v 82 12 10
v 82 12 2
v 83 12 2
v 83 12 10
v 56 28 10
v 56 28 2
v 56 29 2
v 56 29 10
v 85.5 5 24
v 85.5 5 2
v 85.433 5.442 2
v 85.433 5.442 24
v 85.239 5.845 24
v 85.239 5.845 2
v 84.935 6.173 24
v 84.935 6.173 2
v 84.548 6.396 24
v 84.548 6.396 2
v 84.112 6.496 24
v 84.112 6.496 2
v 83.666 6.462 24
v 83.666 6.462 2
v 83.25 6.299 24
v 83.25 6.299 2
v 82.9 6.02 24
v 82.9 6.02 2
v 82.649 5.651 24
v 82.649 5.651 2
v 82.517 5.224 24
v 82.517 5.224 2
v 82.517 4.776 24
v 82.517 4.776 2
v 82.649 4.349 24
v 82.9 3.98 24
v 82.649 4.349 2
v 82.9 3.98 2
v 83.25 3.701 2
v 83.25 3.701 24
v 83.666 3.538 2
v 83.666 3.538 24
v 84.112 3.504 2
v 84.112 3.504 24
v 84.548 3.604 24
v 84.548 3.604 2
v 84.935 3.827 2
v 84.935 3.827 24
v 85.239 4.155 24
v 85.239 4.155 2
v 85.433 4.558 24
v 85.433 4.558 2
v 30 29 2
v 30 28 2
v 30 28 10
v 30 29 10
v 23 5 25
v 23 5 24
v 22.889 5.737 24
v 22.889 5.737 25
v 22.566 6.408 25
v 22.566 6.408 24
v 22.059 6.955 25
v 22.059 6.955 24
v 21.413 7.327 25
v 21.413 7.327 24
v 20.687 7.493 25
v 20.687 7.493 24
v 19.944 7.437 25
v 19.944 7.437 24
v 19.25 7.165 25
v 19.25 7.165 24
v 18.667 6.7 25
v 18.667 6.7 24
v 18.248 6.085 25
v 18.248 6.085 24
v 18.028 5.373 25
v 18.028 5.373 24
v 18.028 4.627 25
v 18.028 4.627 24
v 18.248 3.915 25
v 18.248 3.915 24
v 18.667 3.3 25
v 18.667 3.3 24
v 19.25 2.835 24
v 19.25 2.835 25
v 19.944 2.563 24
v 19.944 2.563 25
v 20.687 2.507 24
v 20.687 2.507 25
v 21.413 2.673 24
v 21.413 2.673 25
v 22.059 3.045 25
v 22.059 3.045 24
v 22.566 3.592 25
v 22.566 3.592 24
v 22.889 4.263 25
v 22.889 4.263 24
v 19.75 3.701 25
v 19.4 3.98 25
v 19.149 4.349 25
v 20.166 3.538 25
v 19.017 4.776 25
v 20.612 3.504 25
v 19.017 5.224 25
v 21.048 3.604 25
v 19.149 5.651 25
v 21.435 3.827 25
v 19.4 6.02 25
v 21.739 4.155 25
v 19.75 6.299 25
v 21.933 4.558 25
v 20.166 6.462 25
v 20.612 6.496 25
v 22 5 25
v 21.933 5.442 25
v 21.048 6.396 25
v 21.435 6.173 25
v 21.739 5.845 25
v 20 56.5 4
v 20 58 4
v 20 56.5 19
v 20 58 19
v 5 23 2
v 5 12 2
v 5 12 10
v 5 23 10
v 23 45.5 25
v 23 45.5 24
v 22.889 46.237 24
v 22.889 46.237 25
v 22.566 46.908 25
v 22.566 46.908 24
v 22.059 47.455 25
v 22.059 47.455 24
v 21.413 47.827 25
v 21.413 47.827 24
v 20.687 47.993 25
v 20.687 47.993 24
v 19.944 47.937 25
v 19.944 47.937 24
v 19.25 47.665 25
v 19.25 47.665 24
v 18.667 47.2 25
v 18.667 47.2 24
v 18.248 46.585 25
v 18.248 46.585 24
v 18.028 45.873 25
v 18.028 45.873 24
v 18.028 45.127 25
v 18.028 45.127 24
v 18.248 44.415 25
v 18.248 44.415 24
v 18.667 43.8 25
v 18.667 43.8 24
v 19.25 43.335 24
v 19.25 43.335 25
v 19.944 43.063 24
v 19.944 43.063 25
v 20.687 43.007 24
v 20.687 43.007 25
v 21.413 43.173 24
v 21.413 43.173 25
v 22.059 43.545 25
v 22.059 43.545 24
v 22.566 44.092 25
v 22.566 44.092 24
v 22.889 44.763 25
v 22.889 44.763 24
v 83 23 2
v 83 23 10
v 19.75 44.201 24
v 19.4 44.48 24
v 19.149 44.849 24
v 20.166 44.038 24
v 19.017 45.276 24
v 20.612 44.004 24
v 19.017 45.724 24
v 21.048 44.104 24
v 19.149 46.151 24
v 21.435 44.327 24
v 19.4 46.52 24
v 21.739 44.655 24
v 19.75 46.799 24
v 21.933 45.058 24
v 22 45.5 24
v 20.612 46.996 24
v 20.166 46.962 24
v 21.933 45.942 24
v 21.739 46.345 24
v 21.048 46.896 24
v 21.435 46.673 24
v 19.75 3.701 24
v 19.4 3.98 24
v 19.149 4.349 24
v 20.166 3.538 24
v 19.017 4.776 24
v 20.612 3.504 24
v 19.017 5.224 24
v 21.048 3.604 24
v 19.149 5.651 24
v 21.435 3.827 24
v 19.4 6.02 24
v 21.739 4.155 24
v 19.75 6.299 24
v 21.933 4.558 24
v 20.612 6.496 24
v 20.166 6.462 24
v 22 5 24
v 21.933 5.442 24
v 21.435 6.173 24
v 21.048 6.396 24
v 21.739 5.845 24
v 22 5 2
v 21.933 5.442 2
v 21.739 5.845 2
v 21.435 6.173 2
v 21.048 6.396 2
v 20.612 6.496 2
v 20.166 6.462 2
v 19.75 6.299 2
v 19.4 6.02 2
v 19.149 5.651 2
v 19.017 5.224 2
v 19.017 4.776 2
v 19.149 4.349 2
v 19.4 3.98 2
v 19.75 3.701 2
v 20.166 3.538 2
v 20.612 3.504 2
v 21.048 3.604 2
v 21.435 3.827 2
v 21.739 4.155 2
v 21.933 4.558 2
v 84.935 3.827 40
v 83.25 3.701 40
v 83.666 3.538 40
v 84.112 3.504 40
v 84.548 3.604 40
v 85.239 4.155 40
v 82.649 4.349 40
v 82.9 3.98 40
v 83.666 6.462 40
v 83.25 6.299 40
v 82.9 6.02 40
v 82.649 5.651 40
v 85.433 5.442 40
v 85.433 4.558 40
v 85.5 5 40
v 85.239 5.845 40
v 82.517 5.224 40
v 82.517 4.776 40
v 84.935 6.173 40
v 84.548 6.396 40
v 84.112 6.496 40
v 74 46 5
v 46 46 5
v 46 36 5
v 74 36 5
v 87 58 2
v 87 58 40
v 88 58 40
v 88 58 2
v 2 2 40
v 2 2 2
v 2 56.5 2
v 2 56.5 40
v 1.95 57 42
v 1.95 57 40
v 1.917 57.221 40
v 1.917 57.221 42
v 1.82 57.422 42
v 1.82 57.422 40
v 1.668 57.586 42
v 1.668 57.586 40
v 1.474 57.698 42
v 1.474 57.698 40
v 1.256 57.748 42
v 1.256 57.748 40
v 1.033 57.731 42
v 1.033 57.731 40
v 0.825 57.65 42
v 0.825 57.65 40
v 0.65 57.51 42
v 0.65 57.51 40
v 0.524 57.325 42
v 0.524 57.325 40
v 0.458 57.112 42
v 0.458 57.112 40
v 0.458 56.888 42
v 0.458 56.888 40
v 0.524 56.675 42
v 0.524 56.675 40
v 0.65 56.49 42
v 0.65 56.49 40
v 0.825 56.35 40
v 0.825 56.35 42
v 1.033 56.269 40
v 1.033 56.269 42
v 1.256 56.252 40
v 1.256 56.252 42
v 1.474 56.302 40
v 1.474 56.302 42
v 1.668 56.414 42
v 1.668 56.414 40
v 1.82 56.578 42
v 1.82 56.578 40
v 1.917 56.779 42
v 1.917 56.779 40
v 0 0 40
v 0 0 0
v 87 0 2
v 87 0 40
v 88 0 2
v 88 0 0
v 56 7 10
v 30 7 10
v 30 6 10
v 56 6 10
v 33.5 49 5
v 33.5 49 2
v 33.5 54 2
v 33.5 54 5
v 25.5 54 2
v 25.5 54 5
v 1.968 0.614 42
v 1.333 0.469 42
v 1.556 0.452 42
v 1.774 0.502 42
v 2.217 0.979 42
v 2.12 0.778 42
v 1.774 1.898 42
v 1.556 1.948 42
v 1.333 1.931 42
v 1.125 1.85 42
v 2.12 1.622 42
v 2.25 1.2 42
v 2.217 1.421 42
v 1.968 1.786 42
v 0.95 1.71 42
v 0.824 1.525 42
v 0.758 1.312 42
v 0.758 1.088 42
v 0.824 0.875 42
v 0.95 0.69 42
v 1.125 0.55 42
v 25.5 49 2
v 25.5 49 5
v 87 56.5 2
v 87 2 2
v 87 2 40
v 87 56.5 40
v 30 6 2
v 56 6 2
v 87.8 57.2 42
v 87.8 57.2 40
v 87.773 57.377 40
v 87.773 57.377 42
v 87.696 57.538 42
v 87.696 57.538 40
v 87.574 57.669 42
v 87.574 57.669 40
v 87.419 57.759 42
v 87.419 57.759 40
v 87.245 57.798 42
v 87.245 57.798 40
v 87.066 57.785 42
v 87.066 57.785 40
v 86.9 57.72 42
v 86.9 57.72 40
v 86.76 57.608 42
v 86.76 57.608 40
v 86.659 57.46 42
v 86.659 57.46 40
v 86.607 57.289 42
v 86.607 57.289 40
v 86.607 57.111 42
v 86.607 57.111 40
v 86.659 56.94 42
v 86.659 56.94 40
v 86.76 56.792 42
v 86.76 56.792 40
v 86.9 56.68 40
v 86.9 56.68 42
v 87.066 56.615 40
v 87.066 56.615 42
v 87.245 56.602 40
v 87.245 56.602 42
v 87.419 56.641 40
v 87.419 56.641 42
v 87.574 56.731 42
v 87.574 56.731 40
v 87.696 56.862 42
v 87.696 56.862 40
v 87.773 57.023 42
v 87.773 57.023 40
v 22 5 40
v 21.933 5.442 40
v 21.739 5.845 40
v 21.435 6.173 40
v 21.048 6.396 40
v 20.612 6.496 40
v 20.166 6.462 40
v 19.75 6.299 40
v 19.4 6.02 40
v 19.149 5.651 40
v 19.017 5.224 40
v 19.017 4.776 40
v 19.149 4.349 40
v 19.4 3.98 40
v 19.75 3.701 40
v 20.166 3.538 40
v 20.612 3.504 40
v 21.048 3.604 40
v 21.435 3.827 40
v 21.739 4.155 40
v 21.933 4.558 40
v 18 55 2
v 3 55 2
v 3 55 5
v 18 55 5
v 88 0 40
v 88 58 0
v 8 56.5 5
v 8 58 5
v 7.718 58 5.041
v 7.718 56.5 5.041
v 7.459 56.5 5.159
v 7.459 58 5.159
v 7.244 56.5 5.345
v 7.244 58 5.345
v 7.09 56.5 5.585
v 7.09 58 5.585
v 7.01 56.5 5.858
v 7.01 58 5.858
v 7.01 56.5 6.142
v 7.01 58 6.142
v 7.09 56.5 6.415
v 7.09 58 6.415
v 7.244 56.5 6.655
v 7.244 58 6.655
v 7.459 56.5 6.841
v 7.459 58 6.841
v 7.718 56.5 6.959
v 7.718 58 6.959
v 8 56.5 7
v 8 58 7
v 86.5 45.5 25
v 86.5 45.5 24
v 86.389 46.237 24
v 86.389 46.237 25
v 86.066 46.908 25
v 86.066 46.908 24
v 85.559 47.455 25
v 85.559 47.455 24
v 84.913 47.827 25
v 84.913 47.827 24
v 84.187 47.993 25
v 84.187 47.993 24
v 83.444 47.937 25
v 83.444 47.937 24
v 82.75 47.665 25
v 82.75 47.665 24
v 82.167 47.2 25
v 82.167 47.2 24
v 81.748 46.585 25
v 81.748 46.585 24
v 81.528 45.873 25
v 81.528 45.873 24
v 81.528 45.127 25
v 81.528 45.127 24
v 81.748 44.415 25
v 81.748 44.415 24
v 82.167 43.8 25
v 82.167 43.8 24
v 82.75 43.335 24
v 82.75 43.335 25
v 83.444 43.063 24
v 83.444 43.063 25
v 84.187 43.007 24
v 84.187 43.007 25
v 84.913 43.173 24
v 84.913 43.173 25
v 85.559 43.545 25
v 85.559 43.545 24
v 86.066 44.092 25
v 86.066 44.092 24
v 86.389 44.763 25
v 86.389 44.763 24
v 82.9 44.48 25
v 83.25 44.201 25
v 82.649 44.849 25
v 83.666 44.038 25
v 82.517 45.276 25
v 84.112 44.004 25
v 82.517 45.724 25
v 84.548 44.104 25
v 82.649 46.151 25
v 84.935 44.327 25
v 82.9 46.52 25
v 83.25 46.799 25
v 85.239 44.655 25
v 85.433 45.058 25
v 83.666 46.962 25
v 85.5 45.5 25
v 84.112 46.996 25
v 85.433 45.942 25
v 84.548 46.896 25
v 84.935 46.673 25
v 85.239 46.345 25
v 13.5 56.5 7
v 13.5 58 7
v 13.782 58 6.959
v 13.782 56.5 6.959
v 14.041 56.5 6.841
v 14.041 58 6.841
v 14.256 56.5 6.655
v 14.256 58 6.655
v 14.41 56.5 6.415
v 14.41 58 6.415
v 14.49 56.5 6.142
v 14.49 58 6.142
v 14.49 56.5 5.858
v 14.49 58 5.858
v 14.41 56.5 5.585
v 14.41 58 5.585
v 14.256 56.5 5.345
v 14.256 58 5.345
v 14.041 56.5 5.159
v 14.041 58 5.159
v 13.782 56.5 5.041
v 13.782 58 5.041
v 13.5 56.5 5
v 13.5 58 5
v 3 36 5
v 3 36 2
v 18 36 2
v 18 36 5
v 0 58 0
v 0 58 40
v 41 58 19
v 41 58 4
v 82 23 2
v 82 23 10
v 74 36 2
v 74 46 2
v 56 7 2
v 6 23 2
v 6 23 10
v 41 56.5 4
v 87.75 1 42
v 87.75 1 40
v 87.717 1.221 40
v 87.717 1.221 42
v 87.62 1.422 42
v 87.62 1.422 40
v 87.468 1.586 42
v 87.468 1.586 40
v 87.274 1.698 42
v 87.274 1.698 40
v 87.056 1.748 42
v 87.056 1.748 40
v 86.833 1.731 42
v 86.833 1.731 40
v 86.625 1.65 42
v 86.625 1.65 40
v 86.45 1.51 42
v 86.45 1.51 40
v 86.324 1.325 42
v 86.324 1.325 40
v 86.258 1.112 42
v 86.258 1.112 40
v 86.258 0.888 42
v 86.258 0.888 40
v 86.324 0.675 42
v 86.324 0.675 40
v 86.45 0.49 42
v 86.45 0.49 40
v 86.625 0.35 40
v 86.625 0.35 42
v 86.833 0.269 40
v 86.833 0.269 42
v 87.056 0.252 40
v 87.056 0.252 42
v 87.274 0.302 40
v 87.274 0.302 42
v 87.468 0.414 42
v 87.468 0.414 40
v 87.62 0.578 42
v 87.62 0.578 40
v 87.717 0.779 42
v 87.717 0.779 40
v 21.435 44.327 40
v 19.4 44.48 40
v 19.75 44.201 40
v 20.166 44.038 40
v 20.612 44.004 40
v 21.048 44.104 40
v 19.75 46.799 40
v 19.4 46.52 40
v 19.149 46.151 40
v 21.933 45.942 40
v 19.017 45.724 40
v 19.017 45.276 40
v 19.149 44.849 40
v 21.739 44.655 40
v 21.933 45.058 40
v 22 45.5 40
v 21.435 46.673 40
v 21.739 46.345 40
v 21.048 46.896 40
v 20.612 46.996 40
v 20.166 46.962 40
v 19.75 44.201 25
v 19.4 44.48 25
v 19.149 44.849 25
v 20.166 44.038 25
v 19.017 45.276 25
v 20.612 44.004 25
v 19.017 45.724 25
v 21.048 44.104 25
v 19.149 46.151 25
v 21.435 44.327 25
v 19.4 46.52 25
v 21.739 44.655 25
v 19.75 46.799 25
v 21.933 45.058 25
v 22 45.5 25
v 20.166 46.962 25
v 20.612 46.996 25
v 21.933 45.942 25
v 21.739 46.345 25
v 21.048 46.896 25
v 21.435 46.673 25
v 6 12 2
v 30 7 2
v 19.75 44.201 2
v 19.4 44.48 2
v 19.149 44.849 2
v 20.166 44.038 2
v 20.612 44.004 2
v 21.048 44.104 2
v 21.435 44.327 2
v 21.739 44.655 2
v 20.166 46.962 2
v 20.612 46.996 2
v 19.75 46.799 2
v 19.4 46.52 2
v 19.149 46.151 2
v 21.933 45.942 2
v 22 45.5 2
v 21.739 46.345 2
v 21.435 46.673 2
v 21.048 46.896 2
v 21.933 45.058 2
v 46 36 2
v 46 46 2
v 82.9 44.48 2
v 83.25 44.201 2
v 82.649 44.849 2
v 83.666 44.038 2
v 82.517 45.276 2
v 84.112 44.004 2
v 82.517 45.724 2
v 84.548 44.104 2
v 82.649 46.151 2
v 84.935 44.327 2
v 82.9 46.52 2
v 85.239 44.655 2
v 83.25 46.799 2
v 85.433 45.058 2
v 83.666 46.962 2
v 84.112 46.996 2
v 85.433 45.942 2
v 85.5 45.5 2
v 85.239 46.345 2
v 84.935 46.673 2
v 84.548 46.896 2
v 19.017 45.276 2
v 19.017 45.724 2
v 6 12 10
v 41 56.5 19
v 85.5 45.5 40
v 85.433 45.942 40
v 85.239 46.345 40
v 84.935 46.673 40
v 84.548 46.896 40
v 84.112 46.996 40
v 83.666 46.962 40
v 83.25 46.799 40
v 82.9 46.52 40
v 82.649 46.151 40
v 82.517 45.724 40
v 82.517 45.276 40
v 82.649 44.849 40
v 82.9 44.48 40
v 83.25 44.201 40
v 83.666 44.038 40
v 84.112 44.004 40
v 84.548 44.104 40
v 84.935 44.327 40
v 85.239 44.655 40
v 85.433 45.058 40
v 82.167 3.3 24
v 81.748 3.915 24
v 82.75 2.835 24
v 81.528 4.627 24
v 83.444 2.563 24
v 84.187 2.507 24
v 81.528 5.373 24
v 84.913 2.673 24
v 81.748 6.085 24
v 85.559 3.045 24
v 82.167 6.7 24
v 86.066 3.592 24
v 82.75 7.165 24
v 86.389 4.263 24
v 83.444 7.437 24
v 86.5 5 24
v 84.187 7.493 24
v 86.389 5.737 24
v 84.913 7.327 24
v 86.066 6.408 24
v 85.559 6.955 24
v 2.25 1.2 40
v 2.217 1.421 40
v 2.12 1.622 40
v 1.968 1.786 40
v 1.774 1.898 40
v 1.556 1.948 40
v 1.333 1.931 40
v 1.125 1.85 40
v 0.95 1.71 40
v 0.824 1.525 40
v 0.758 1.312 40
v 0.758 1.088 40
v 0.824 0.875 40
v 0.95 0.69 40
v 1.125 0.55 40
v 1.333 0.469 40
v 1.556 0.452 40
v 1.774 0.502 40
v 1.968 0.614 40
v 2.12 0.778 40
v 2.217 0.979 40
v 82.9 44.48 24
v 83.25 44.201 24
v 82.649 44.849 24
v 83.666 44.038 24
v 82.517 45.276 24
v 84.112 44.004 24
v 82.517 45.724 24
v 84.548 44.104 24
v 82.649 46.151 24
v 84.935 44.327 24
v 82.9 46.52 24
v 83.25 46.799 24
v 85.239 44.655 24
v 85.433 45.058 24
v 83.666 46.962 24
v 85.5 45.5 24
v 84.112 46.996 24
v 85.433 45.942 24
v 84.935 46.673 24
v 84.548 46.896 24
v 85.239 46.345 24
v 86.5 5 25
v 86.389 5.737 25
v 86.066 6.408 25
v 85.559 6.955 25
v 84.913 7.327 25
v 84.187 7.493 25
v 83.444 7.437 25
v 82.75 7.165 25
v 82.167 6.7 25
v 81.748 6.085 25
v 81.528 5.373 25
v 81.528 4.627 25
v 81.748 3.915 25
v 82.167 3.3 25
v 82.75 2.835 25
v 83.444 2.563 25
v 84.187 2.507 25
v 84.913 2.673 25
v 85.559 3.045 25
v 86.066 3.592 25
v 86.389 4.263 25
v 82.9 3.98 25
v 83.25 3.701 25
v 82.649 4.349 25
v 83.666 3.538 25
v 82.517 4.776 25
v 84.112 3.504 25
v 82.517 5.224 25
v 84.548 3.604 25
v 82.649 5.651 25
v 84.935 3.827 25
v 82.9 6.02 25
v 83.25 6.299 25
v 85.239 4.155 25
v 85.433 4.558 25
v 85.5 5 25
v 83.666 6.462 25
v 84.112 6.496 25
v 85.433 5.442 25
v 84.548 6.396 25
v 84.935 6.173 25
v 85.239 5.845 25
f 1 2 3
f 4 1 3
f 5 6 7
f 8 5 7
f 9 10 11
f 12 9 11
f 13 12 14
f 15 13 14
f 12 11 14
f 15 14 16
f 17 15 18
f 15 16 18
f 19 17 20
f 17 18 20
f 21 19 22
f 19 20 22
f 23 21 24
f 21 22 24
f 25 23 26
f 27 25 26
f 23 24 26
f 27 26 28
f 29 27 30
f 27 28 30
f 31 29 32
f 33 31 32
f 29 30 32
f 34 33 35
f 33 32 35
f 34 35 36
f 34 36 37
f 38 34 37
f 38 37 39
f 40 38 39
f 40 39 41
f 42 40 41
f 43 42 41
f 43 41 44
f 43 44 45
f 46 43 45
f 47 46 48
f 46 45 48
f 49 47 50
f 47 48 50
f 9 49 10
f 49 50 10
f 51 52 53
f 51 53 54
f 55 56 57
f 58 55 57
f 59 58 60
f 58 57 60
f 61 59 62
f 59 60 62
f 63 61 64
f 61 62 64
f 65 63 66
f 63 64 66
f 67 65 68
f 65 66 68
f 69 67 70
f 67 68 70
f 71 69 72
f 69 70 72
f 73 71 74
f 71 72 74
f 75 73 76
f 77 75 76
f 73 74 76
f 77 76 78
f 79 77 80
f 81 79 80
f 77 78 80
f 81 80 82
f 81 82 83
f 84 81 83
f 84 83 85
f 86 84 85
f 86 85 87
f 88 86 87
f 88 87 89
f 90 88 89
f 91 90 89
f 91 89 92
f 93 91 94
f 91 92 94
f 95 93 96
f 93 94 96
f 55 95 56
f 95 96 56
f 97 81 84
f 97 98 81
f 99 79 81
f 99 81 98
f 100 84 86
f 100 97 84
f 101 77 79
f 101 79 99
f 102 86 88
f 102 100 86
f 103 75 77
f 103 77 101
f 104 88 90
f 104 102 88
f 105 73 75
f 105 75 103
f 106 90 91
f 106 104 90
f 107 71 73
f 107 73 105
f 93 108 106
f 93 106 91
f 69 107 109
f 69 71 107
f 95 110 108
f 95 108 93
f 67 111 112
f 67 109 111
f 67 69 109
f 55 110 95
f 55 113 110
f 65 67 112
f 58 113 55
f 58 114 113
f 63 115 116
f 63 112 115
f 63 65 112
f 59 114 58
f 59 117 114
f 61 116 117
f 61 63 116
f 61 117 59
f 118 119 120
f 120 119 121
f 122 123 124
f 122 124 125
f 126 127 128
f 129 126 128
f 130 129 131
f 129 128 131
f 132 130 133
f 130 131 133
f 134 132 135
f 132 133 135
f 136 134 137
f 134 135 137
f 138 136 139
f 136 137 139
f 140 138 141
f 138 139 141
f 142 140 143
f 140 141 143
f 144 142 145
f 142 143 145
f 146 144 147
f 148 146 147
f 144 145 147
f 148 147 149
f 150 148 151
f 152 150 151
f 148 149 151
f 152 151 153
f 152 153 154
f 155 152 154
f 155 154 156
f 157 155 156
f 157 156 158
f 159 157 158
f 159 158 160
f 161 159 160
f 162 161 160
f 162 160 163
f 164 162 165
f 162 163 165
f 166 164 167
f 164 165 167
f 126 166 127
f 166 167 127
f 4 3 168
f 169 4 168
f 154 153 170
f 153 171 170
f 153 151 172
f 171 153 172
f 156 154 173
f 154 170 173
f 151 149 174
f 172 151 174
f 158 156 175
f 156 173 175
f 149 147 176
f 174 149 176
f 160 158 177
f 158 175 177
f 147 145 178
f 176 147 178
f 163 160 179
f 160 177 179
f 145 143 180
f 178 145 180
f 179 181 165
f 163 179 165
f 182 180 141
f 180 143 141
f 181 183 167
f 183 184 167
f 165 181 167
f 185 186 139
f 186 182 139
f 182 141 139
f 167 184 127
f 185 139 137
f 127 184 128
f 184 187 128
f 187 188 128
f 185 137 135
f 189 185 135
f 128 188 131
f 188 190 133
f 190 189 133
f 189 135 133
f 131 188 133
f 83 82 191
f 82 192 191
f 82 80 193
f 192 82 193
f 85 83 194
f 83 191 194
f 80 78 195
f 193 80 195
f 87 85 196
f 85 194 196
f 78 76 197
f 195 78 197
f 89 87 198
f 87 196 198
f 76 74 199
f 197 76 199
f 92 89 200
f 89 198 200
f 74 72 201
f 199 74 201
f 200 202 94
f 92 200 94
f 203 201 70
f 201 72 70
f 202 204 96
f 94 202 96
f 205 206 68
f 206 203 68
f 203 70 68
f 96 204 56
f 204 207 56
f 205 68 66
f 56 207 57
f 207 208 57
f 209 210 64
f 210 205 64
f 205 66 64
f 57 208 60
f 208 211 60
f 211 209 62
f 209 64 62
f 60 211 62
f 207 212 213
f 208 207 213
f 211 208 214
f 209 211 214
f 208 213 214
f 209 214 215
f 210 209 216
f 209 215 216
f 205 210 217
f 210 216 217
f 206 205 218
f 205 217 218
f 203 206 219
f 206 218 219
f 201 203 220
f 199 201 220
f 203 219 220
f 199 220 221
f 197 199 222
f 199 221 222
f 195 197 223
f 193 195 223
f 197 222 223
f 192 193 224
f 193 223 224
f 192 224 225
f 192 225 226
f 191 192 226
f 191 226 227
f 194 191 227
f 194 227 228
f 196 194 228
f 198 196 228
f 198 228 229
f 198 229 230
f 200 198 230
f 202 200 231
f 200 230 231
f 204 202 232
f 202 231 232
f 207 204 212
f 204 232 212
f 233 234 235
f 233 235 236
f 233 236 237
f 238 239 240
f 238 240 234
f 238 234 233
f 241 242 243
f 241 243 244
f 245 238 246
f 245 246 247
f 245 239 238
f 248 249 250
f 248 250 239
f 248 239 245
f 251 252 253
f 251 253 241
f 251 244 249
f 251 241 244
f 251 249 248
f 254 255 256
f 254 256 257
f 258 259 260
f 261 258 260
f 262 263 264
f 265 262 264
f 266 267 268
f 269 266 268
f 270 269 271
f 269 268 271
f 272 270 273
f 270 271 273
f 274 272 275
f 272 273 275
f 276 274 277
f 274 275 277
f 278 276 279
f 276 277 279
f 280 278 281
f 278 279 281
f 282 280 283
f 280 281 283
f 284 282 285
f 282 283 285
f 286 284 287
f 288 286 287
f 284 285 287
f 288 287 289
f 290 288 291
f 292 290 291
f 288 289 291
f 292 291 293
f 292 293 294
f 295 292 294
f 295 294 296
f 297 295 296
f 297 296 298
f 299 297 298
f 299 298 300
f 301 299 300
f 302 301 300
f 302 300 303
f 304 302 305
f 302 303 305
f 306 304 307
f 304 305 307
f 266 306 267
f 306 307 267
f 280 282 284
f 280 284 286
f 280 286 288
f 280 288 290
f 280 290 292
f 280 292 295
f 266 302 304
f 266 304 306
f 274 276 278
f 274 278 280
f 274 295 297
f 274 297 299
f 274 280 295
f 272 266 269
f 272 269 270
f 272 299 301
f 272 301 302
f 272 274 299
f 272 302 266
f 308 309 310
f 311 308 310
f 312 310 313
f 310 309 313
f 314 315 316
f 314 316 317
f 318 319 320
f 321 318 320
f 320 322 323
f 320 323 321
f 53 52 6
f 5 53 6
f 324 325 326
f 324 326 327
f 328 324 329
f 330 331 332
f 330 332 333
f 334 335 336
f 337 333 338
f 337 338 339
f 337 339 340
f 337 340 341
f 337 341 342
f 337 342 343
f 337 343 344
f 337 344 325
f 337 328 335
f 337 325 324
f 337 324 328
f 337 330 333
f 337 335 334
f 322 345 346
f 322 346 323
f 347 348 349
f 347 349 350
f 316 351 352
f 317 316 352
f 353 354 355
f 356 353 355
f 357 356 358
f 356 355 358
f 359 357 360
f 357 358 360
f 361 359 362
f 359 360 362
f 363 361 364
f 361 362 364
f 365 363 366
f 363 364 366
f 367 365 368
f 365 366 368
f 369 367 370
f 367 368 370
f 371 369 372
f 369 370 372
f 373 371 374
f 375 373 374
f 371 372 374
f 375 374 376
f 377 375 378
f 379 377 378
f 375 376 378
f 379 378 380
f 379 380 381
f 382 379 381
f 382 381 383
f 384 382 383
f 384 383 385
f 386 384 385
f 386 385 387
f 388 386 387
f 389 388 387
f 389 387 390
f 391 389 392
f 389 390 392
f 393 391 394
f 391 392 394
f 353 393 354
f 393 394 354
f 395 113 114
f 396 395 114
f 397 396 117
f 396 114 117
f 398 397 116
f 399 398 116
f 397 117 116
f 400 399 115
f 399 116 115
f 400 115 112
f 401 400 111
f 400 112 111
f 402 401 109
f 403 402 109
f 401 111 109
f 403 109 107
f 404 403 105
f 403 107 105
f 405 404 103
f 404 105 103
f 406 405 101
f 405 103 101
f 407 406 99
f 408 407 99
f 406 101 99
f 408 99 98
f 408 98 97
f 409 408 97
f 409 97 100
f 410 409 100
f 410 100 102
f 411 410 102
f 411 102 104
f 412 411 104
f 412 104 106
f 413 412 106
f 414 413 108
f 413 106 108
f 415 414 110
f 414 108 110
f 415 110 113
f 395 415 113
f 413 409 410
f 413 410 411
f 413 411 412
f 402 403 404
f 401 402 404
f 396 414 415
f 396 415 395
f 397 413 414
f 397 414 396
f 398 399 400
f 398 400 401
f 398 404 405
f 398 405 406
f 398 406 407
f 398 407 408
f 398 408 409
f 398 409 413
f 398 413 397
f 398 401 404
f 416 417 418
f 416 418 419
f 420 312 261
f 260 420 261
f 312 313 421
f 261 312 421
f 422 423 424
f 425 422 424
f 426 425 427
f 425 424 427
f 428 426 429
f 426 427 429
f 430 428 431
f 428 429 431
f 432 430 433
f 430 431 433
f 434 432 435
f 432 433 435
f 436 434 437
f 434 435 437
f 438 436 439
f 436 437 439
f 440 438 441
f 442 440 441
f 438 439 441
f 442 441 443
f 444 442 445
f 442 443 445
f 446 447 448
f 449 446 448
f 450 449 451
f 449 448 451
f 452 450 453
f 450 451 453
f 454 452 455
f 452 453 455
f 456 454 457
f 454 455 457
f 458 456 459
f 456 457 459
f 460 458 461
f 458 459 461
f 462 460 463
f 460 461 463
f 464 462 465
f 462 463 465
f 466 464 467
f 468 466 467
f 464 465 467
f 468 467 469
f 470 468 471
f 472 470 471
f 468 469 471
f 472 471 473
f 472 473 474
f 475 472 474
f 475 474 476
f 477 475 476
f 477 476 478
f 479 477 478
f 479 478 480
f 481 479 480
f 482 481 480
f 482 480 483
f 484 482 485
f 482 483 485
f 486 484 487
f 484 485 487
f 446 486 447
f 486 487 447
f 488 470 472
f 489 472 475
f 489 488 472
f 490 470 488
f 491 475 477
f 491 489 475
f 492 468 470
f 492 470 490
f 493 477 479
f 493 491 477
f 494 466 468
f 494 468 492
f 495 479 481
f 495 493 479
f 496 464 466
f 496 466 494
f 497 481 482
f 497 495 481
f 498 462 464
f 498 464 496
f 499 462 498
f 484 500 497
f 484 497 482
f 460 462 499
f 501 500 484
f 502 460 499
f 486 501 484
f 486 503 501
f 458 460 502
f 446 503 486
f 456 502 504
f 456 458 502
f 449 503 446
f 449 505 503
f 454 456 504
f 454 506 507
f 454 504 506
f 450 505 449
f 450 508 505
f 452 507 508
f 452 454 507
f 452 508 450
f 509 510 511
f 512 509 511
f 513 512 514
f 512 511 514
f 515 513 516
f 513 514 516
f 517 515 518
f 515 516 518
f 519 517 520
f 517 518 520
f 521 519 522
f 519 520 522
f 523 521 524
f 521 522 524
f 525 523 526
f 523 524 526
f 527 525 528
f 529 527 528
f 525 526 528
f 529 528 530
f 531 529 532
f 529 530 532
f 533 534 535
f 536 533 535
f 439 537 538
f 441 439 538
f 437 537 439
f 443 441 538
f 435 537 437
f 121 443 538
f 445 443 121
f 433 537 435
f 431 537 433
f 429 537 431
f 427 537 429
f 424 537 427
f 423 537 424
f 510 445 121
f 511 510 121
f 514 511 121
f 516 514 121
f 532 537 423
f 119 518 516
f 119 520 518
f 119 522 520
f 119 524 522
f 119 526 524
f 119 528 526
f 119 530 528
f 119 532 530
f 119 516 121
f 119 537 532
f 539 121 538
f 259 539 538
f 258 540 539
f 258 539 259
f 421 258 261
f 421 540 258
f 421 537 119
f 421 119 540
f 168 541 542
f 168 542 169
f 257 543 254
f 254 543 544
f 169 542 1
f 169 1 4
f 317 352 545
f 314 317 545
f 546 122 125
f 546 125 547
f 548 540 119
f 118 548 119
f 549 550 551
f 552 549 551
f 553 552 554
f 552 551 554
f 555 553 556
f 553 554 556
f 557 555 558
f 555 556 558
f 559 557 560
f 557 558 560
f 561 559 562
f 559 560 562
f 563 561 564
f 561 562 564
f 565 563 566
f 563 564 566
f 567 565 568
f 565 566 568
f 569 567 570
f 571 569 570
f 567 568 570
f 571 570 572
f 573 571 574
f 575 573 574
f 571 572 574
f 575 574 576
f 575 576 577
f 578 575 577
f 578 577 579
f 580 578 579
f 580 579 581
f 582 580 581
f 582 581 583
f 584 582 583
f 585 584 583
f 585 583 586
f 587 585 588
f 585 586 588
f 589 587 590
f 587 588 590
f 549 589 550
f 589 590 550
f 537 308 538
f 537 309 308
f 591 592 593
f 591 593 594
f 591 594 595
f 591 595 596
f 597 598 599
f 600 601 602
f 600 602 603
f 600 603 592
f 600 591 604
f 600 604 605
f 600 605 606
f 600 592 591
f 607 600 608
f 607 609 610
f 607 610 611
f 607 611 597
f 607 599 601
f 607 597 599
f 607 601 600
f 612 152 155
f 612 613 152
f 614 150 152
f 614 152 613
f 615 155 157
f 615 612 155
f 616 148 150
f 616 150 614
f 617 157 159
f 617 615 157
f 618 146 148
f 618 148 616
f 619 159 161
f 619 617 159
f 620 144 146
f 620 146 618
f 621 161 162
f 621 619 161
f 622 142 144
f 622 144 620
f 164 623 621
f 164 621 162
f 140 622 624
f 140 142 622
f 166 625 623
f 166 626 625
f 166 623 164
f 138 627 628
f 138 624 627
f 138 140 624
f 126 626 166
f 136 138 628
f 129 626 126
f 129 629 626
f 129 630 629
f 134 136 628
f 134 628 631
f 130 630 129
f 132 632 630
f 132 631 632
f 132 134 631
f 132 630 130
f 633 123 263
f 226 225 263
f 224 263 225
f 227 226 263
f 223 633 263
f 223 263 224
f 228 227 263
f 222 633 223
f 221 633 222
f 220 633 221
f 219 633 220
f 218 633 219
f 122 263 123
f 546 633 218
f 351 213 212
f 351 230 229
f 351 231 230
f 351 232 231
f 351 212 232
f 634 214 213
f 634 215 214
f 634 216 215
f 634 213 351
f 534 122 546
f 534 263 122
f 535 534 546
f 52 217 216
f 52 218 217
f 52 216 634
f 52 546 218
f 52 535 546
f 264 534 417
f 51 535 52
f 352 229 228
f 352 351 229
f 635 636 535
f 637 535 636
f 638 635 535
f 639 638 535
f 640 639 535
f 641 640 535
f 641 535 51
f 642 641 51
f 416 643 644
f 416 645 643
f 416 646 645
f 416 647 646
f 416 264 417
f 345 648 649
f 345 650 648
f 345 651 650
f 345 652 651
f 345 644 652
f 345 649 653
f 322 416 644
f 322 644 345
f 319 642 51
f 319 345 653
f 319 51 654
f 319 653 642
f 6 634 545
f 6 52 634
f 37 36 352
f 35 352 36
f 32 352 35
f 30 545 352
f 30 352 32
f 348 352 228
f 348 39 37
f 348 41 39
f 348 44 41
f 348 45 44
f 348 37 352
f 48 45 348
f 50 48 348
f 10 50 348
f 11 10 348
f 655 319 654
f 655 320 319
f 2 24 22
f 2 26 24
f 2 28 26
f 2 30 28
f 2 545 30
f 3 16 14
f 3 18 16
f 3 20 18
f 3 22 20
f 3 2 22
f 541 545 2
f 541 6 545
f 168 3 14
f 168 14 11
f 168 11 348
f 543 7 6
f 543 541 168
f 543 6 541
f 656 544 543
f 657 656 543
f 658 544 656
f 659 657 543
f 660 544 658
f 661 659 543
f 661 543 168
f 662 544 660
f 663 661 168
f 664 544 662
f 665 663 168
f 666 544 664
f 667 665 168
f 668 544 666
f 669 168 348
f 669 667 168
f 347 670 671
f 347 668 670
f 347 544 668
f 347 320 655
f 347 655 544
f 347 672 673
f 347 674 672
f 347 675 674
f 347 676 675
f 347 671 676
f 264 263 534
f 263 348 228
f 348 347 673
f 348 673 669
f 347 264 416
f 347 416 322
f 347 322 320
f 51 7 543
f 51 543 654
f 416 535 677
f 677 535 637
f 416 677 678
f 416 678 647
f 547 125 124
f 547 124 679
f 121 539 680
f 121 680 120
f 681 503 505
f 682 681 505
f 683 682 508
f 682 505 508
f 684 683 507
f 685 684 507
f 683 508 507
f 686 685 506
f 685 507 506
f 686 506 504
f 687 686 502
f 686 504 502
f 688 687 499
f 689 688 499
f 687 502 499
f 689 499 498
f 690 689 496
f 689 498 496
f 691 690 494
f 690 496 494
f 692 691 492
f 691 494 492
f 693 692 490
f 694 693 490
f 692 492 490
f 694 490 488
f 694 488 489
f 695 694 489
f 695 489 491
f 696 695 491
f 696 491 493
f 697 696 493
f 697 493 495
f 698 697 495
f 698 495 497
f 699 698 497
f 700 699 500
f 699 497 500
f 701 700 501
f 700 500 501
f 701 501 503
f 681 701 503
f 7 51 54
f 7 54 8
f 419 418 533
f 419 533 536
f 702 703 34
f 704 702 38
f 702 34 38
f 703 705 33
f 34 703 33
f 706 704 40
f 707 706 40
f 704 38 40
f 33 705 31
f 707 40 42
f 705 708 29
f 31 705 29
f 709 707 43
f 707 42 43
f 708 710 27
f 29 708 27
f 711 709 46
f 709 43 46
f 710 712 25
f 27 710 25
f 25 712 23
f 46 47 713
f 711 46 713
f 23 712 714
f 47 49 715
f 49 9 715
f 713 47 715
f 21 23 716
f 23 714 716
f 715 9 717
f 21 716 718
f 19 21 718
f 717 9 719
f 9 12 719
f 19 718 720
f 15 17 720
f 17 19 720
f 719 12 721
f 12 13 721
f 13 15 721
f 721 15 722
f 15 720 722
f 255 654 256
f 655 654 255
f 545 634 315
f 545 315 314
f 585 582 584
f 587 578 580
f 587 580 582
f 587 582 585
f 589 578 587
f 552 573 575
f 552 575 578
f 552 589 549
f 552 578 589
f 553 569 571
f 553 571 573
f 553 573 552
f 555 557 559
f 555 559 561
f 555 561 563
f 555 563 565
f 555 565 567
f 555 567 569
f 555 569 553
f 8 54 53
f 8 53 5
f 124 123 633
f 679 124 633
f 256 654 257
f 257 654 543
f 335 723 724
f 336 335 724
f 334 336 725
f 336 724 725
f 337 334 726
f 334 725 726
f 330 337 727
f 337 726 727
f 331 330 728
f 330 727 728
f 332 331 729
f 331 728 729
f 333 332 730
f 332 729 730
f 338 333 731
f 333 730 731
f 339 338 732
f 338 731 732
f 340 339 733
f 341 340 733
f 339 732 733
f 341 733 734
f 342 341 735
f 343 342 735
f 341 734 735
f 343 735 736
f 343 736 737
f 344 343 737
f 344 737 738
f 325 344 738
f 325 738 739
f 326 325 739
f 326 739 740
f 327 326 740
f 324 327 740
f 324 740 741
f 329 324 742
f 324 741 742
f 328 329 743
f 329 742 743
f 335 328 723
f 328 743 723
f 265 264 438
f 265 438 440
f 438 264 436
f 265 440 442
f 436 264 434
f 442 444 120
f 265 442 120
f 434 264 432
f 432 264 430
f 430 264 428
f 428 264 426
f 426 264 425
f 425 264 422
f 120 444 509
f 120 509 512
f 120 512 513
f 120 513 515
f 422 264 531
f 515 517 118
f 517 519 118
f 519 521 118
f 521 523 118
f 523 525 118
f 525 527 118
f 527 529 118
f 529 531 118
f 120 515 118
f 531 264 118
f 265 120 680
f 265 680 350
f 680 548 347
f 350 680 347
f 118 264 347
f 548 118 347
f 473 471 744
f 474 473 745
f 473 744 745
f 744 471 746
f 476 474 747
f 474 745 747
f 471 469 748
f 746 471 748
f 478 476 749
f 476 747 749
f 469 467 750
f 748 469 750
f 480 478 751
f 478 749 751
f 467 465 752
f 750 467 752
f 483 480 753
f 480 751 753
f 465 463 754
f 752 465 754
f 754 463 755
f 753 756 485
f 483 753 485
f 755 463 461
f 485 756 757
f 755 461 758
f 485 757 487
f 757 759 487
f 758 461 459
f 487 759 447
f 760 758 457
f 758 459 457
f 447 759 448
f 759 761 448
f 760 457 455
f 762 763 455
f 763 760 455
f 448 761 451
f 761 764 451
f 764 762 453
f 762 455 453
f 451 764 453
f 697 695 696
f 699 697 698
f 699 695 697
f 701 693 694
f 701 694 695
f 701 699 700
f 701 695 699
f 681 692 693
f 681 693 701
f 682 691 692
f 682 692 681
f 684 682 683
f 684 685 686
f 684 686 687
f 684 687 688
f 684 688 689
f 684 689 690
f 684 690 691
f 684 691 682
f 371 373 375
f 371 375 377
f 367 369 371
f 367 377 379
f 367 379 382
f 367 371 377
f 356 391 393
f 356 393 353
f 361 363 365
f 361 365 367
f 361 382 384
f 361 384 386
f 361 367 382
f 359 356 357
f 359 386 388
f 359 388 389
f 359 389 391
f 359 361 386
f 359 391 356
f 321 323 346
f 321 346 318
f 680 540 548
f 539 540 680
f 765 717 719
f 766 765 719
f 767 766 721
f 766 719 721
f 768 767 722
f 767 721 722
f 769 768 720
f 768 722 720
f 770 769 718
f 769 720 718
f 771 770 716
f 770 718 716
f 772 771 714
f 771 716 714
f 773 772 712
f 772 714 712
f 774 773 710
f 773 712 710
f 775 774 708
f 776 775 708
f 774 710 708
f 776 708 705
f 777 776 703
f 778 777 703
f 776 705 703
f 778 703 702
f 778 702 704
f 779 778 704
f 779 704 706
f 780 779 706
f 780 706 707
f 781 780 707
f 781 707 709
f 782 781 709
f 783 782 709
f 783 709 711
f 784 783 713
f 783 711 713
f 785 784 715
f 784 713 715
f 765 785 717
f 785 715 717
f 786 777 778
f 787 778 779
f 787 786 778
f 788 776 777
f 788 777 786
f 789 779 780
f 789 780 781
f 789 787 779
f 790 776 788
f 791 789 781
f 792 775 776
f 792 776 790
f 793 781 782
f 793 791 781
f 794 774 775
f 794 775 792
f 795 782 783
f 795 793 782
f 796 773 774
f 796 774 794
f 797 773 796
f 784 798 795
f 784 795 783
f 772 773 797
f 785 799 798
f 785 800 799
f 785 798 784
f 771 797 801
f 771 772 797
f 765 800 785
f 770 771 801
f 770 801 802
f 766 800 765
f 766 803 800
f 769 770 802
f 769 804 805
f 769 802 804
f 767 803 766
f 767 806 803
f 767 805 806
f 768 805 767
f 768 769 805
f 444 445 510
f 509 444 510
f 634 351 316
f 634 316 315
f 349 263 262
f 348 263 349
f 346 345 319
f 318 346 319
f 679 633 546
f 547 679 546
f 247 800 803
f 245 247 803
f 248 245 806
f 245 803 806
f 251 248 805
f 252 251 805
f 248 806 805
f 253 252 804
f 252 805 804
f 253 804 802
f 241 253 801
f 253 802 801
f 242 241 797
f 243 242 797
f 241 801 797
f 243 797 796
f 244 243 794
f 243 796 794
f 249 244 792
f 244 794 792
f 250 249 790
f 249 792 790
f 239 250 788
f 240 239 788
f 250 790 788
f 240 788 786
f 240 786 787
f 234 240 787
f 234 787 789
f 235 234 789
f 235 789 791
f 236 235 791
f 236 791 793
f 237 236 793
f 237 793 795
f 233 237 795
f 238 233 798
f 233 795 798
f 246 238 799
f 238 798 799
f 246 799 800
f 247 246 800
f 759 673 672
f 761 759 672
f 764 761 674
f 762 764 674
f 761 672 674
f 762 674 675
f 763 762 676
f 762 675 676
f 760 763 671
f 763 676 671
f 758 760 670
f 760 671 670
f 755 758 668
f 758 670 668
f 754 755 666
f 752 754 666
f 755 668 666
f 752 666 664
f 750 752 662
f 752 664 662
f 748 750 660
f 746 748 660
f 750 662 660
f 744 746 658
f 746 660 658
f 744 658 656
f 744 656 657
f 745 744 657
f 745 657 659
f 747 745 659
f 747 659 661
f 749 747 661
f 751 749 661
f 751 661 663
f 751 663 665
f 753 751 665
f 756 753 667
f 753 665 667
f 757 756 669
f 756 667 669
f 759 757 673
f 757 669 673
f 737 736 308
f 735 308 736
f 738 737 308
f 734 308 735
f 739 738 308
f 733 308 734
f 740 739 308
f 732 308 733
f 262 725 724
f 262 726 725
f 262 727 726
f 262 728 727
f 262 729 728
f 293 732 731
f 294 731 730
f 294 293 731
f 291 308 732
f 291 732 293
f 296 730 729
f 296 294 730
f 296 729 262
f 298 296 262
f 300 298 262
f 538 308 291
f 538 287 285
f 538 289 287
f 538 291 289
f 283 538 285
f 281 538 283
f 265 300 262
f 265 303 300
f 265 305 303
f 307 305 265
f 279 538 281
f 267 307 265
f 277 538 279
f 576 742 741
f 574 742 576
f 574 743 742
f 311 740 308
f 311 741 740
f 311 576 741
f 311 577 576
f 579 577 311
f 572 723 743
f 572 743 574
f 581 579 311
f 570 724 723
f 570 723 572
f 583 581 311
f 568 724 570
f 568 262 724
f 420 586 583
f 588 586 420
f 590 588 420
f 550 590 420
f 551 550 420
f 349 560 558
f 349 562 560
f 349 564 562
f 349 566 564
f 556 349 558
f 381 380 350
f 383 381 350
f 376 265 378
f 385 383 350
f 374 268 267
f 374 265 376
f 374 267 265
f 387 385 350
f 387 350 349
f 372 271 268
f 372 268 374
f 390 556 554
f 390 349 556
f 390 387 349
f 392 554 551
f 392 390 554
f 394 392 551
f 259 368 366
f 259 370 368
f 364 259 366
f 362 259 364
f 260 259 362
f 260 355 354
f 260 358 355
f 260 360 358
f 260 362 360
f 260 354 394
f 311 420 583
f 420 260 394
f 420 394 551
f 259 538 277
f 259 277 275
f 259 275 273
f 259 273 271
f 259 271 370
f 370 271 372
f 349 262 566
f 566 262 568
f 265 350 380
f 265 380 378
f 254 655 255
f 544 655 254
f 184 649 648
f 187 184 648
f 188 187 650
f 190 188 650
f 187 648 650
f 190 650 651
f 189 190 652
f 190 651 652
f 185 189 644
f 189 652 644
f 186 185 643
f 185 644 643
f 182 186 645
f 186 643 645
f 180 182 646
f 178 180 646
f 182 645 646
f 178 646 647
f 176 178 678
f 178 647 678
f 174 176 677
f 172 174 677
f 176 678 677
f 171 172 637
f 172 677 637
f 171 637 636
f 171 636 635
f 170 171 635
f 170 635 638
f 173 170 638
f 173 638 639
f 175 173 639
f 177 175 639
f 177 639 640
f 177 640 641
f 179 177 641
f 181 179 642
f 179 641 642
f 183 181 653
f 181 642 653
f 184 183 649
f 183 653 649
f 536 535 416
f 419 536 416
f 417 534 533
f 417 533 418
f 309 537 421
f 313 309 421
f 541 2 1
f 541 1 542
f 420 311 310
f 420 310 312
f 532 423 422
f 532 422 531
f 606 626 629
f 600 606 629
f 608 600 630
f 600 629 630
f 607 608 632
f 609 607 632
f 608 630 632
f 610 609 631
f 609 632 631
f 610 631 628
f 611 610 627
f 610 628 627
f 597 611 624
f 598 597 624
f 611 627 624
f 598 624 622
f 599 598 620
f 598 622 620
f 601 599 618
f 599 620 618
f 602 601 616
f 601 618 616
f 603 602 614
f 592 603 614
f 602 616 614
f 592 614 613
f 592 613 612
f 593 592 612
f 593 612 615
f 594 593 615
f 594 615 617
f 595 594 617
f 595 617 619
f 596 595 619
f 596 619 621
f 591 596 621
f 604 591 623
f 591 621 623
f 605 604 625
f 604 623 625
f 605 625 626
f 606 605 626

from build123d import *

# Parameters (mm, degrees)
SKETCH_W        = 88
SKETCH_H        = 58
PAD_DEPTH       = 2
SKETCH001_W     = 1
SKETCH001_H     = 11
PAD001_DEPTH    = 8
SKETCH002_W     = 1
SKETCH002_H     = 11
PAD002_DEPTH    = 8
SKETCH003_W     = 26
SKETCH003_H     = 1
PAD003_DEPTH    = 8
SKETCH004_W     = 15
SKETCH004_H     = 19
PAD004_DEPTH    = 3
SKETCH005_W     = 28
SKETCH005_H     = 10
PAD005_DEPTH    = 3
SKETCH006_R     = 1.5
PAD006_DEPTH    = 22
PAD007_DEPTH    = 22
SKETCH007_W     = 8
SKETCH007_H     = 5
PAD008_DEPTH    = 3
SKETCH008_R     = 2.5
PAD009_DEPTH    = 1
SKETCH009_R     = 1.5
PAD010_DEPTH    = 15
SKETCH010_W     = 2
SKETCH010_H     = 58
SKETCH010_W_2   = 1
PAD011_DEPTH    = 38
SKETCH011_W     = 85
SKETCH011_H     = 2
SKETCH011_H_2   = 1.5
PAD012_DEPTH    = 38
SKETCH012_R     = 0.75
SKETCH012_R_2   = 0.6
PAD013_DEPTH    = 2
POCKET_DEPTH    = 1.5
SKETCH014_W     = 21
SKETCH014_H     = 15
POCKET001_DEPTH = 1.5


with BuildPart() as part:
    # Sketch → Pad (new body)
    with BuildSketch(Plane.XY):
        with Locations((44, 29)):
            Rectangle(SKETCH_W, SKETCH_H)
    extrude(amount=PAD_DEPTH)

    # Sketch001 (on Face6 of Pad) → Pad001 (join)
    with BuildSketch(Plane.XY.offset(2)):
        with Locations((5.5, 17.5)):
            Rectangle(SKETCH001_W, SKETCH001_H)
    extrude(amount=PAD001_DEPTH)

    # Sketch002 (on Face5 of Pad001) → Pad002 (join)
    with BuildSketch(Plane.XY.offset(2)):
        with Locations((82.5, 17.5)):
            Rectangle(SKETCH002_W, SKETCH002_H)
    extrude(amount=PAD002_DEPTH)

    # Sketch003 (on Face5 of Pad002) → Pad003 (join)
    with BuildSketch(Plane.XY.offset(2)):
        with Locations((43, 6.5)):
            Rectangle(SKETCH003_W, SKETCH003_H)
        with Locations((43, 28.5)):
            Rectangle(SKETCH003_W, SKETCH003_H)
    extrude(amount=PAD003_DEPTH)

    # Sketch004 (on Face5 of Pad003) → Pad004 (join)
    with BuildSketch(Plane.XY.offset(2)):
        with Locations((10.5, 45.5)):
            Rectangle(SKETCH004_W, SKETCH004_H)
    extrude(amount=PAD004_DEPTH)

    # Sketch005 (on Face5 of Pad004) → Pad005 (join)
    with BuildSketch(Plane.XY.offset(2)):
        with Locations((60, 41)):
            Rectangle(SKETCH005_W, SKETCH005_H)
    extrude(amount=PAD005_DEPTH)

    # Sketch006 (on Face5 of Pad005) → Pad006 (join)
    with BuildSketch(Plane.XY.offset(2)):
        with Locations((84, 5)):
            Circle(SKETCH006_R)
        with Locations((20.5, 5)):
            Circle(SKETCH006_R)
        with Locations((20.5, 45.5)):
            Circle(SKETCH006_R)
        with Locations((84, 45.5)):
            Circle(SKETCH006_R)
    extrude(amount=PAD006_DEPTH)

    # Sketch006 (on Face5 of Pad005) → Pad007 (join)
    with BuildSketch(Plane.XY.offset(2)):
        with Locations((84, 5)):
            Circle(SKETCH006_R)
        with Locations((20.5, 5)):
            Circle(SKETCH006_R)
        with Locations((20.5, 45.5)):
            Circle(SKETCH006_R)
        with Locations((84, 45.5)):
            Circle(SKETCH006_R)
    extrude(amount=PAD007_DEPTH)

    # Sketch007 (on Face5 of Pad007) → Pad008 (join)
    with BuildSketch(Plane.XY.offset(2)):
        with Locations((29.5, 51.5)):
            Rectangle(SKETCH007_W, SKETCH007_H)
    extrude(amount=PAD008_DEPTH)

    # Sketch008 (on Face35 of Pad007) → Pad009 (join)
    with BuildSketch(Plane.XY.offset(24)):
        with Locations((20.5, 5)):
            Circle(SKETCH008_R)
        with Locations((84, 5)):
            Circle(SKETCH008_R)
        with Locations((20.5, 45.5)):
            Circle(SKETCH008_R)
        with Locations((84, 45.5)):
            Circle(SKETCH008_R)
    extrude(amount=PAD009_DEPTH)

    # Sketch009 (on Face54 of Pad009) → Pad010 (join)
    with BuildSketch(Plane.XY.offset(25)):
        with Locations((20.5, 5)):
            Circle(SKETCH009_R)
        with Locations((84, 5)):
            Circle(SKETCH009_R)
        with Locations((20.5, 45.5)):
            Circle(SKETCH009_R)
        with Locations((84, 45.5)):
            Circle(SKETCH009_R)
    extrude(amount=PAD010_DEPTH)

    # Sketch010 (on Face5 of Pad010) → Pad011 (join)
    with BuildSketch(Plane.XY.offset(2)):
        with Locations((1, 29)):
            Rectangle(SKETCH010_W, SKETCH010_H)
        with Locations((87.5, 29.00001)):
            Rectangle(SKETCH010_W_2, SKETCH010_H)
    extrude(amount=PAD011_DEPTH)

    # Sketch011 (on Face5 of Pad010) → Pad012 (join)
    with BuildSketch(Plane.XY.offset(2)):
        with Locations((44.5, 1)):
            Rectangle(SKETCH011_W, SKETCH011_H)
        with Locations((44.5, 57.25)):
            Rectangle(SKETCH011_W, SKETCH011_H_2)
    extrude(amount=PAD012_DEPTH)

    # Sketch012 (on Face11 of Pad012) → Pad013 (join)
    with BuildSketch(Plane.XY.offset(40)):
        with Locations((1.5, 1.2)):
            Circle(SKETCH012_R)
        with Locations((1.2, 57)):
            Circle(SKETCH012_R)
        with Locations((87.2, 57.2)):
            Circle(SKETCH012_R_2)
        with Locations((87, 1)):
            Circle(SKETCH012_R)
    extrude(amount=PAD013_DEPTH)

    # Sketch013 (on Face15 of Pad013) → Pocket (cut)
    with BuildSketch(Plane(origin=(0, 58, 0), x_dir=(-1, 0, 0), z_dir=(0, 1, 0))):
        with BuildLine():
            ThreePointArc((-8, 5), (-7, 6), (-8, 7))
            Line((-8, 7), (-13.5, 7))
            ThreePointArc((-13.5, 7), (-14.5, 6), (-13.5, 5))
            Line((-8, 5), (-13.5, 5))
        make_face()
    extrude(amount=-POCKET_DEPTH, mode=Mode.SUBTRACT)

    # Sketch014 (on Face15 of Pocket) → Pocket001 (cut)
    with BuildSketch(Plane(origin=(0, 58, 0), x_dir=(-1, 0, 0), z_dir=(0, 1, 0))):
        with Locations((-30.5, 11.5)):
            Rectangle(SKETCH014_W, SKETCH014_H)
    extrude(amount=-POCKET001_DEPTH, mode=Mode.SUBTRACT)


solid = part.part
